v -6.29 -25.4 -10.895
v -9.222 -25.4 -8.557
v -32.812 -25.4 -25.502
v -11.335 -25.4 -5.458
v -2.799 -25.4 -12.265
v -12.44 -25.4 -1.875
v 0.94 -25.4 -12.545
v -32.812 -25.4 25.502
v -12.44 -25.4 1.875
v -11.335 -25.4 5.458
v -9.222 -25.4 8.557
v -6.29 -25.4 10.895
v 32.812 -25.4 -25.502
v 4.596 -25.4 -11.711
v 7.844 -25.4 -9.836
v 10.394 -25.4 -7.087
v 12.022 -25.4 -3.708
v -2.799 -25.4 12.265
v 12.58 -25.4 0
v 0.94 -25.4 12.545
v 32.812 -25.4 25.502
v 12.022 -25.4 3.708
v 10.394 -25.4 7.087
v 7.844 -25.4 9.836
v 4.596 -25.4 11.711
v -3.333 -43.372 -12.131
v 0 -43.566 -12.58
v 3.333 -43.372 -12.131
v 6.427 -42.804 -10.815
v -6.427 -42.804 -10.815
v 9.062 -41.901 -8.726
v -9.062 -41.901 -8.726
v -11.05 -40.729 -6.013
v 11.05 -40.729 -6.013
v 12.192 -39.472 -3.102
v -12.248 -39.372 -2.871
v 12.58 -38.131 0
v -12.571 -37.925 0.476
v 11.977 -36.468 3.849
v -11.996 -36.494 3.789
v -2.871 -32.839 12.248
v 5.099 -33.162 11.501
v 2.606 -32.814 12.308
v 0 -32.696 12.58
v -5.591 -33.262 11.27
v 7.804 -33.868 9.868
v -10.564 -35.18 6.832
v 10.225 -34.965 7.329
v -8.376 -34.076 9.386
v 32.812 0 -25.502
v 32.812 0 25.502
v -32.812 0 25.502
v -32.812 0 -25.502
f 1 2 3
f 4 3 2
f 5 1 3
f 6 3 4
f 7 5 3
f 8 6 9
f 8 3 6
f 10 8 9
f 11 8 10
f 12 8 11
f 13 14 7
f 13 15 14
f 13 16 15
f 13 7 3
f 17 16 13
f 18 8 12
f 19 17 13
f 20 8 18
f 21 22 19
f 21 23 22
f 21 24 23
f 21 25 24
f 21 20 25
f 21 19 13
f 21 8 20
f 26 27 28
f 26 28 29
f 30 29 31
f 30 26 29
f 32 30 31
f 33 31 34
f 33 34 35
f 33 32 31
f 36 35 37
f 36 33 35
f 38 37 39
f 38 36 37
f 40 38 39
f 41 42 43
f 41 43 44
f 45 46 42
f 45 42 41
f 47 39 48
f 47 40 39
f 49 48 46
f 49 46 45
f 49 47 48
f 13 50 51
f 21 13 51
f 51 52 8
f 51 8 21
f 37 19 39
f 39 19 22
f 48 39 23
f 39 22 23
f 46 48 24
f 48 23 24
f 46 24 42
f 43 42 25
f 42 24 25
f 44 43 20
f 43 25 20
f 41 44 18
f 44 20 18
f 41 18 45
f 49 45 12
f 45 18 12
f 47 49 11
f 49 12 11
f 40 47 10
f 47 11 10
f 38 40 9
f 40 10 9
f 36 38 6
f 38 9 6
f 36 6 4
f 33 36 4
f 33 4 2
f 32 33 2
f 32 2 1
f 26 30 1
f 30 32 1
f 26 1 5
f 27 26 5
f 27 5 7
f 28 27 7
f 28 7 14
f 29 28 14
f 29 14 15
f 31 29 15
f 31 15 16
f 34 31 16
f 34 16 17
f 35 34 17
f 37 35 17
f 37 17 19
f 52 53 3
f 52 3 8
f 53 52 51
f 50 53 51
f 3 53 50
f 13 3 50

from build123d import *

# Parameters (mm, degrees)
F0_W          = 65.6240805984
F0_H          = 51.0048568249
F1_DEPTH      = 25.4
F2_R          = 12.5804275278
F3_DEPTH      = 25.4
F5_DEPTH      = 25.4
F5_DEPTH_BACK = 25.4


with BuildPart() as f1:
    # F0 (on Front) → F1 (new body)
    with BuildSketch(Plane.XZ):
        Rectangle(F0_W, F0_H)
    extrude(amount=F1_DEPTH)

    # F2 (on face) → F3 (join)
    with BuildSketch(Plane.XZ.offset(25.4)):
        Circle(F2_R)
    extrude(amount=F3_DEPTH)

    # F4 (on Right) → F5 (cut, two sides)
    with BuildSketch(Plane.YZ) as f5_sk:
        Polygon((-51.2365475297, -13.4750008583), (-43.6296612024, -12.7267818898), (-32.5310863554, 12.9620563239), (-51.2365475297, 12.9620563239), align=None)
    extrude(amount=-F5_DEPTH, mode=Mode.SUBTRACT)
    extrude(f5_sk.sketch, amount=F5_DEPTH_BACK, mode=Mode.SUBTRACT)


solid = f1.part
